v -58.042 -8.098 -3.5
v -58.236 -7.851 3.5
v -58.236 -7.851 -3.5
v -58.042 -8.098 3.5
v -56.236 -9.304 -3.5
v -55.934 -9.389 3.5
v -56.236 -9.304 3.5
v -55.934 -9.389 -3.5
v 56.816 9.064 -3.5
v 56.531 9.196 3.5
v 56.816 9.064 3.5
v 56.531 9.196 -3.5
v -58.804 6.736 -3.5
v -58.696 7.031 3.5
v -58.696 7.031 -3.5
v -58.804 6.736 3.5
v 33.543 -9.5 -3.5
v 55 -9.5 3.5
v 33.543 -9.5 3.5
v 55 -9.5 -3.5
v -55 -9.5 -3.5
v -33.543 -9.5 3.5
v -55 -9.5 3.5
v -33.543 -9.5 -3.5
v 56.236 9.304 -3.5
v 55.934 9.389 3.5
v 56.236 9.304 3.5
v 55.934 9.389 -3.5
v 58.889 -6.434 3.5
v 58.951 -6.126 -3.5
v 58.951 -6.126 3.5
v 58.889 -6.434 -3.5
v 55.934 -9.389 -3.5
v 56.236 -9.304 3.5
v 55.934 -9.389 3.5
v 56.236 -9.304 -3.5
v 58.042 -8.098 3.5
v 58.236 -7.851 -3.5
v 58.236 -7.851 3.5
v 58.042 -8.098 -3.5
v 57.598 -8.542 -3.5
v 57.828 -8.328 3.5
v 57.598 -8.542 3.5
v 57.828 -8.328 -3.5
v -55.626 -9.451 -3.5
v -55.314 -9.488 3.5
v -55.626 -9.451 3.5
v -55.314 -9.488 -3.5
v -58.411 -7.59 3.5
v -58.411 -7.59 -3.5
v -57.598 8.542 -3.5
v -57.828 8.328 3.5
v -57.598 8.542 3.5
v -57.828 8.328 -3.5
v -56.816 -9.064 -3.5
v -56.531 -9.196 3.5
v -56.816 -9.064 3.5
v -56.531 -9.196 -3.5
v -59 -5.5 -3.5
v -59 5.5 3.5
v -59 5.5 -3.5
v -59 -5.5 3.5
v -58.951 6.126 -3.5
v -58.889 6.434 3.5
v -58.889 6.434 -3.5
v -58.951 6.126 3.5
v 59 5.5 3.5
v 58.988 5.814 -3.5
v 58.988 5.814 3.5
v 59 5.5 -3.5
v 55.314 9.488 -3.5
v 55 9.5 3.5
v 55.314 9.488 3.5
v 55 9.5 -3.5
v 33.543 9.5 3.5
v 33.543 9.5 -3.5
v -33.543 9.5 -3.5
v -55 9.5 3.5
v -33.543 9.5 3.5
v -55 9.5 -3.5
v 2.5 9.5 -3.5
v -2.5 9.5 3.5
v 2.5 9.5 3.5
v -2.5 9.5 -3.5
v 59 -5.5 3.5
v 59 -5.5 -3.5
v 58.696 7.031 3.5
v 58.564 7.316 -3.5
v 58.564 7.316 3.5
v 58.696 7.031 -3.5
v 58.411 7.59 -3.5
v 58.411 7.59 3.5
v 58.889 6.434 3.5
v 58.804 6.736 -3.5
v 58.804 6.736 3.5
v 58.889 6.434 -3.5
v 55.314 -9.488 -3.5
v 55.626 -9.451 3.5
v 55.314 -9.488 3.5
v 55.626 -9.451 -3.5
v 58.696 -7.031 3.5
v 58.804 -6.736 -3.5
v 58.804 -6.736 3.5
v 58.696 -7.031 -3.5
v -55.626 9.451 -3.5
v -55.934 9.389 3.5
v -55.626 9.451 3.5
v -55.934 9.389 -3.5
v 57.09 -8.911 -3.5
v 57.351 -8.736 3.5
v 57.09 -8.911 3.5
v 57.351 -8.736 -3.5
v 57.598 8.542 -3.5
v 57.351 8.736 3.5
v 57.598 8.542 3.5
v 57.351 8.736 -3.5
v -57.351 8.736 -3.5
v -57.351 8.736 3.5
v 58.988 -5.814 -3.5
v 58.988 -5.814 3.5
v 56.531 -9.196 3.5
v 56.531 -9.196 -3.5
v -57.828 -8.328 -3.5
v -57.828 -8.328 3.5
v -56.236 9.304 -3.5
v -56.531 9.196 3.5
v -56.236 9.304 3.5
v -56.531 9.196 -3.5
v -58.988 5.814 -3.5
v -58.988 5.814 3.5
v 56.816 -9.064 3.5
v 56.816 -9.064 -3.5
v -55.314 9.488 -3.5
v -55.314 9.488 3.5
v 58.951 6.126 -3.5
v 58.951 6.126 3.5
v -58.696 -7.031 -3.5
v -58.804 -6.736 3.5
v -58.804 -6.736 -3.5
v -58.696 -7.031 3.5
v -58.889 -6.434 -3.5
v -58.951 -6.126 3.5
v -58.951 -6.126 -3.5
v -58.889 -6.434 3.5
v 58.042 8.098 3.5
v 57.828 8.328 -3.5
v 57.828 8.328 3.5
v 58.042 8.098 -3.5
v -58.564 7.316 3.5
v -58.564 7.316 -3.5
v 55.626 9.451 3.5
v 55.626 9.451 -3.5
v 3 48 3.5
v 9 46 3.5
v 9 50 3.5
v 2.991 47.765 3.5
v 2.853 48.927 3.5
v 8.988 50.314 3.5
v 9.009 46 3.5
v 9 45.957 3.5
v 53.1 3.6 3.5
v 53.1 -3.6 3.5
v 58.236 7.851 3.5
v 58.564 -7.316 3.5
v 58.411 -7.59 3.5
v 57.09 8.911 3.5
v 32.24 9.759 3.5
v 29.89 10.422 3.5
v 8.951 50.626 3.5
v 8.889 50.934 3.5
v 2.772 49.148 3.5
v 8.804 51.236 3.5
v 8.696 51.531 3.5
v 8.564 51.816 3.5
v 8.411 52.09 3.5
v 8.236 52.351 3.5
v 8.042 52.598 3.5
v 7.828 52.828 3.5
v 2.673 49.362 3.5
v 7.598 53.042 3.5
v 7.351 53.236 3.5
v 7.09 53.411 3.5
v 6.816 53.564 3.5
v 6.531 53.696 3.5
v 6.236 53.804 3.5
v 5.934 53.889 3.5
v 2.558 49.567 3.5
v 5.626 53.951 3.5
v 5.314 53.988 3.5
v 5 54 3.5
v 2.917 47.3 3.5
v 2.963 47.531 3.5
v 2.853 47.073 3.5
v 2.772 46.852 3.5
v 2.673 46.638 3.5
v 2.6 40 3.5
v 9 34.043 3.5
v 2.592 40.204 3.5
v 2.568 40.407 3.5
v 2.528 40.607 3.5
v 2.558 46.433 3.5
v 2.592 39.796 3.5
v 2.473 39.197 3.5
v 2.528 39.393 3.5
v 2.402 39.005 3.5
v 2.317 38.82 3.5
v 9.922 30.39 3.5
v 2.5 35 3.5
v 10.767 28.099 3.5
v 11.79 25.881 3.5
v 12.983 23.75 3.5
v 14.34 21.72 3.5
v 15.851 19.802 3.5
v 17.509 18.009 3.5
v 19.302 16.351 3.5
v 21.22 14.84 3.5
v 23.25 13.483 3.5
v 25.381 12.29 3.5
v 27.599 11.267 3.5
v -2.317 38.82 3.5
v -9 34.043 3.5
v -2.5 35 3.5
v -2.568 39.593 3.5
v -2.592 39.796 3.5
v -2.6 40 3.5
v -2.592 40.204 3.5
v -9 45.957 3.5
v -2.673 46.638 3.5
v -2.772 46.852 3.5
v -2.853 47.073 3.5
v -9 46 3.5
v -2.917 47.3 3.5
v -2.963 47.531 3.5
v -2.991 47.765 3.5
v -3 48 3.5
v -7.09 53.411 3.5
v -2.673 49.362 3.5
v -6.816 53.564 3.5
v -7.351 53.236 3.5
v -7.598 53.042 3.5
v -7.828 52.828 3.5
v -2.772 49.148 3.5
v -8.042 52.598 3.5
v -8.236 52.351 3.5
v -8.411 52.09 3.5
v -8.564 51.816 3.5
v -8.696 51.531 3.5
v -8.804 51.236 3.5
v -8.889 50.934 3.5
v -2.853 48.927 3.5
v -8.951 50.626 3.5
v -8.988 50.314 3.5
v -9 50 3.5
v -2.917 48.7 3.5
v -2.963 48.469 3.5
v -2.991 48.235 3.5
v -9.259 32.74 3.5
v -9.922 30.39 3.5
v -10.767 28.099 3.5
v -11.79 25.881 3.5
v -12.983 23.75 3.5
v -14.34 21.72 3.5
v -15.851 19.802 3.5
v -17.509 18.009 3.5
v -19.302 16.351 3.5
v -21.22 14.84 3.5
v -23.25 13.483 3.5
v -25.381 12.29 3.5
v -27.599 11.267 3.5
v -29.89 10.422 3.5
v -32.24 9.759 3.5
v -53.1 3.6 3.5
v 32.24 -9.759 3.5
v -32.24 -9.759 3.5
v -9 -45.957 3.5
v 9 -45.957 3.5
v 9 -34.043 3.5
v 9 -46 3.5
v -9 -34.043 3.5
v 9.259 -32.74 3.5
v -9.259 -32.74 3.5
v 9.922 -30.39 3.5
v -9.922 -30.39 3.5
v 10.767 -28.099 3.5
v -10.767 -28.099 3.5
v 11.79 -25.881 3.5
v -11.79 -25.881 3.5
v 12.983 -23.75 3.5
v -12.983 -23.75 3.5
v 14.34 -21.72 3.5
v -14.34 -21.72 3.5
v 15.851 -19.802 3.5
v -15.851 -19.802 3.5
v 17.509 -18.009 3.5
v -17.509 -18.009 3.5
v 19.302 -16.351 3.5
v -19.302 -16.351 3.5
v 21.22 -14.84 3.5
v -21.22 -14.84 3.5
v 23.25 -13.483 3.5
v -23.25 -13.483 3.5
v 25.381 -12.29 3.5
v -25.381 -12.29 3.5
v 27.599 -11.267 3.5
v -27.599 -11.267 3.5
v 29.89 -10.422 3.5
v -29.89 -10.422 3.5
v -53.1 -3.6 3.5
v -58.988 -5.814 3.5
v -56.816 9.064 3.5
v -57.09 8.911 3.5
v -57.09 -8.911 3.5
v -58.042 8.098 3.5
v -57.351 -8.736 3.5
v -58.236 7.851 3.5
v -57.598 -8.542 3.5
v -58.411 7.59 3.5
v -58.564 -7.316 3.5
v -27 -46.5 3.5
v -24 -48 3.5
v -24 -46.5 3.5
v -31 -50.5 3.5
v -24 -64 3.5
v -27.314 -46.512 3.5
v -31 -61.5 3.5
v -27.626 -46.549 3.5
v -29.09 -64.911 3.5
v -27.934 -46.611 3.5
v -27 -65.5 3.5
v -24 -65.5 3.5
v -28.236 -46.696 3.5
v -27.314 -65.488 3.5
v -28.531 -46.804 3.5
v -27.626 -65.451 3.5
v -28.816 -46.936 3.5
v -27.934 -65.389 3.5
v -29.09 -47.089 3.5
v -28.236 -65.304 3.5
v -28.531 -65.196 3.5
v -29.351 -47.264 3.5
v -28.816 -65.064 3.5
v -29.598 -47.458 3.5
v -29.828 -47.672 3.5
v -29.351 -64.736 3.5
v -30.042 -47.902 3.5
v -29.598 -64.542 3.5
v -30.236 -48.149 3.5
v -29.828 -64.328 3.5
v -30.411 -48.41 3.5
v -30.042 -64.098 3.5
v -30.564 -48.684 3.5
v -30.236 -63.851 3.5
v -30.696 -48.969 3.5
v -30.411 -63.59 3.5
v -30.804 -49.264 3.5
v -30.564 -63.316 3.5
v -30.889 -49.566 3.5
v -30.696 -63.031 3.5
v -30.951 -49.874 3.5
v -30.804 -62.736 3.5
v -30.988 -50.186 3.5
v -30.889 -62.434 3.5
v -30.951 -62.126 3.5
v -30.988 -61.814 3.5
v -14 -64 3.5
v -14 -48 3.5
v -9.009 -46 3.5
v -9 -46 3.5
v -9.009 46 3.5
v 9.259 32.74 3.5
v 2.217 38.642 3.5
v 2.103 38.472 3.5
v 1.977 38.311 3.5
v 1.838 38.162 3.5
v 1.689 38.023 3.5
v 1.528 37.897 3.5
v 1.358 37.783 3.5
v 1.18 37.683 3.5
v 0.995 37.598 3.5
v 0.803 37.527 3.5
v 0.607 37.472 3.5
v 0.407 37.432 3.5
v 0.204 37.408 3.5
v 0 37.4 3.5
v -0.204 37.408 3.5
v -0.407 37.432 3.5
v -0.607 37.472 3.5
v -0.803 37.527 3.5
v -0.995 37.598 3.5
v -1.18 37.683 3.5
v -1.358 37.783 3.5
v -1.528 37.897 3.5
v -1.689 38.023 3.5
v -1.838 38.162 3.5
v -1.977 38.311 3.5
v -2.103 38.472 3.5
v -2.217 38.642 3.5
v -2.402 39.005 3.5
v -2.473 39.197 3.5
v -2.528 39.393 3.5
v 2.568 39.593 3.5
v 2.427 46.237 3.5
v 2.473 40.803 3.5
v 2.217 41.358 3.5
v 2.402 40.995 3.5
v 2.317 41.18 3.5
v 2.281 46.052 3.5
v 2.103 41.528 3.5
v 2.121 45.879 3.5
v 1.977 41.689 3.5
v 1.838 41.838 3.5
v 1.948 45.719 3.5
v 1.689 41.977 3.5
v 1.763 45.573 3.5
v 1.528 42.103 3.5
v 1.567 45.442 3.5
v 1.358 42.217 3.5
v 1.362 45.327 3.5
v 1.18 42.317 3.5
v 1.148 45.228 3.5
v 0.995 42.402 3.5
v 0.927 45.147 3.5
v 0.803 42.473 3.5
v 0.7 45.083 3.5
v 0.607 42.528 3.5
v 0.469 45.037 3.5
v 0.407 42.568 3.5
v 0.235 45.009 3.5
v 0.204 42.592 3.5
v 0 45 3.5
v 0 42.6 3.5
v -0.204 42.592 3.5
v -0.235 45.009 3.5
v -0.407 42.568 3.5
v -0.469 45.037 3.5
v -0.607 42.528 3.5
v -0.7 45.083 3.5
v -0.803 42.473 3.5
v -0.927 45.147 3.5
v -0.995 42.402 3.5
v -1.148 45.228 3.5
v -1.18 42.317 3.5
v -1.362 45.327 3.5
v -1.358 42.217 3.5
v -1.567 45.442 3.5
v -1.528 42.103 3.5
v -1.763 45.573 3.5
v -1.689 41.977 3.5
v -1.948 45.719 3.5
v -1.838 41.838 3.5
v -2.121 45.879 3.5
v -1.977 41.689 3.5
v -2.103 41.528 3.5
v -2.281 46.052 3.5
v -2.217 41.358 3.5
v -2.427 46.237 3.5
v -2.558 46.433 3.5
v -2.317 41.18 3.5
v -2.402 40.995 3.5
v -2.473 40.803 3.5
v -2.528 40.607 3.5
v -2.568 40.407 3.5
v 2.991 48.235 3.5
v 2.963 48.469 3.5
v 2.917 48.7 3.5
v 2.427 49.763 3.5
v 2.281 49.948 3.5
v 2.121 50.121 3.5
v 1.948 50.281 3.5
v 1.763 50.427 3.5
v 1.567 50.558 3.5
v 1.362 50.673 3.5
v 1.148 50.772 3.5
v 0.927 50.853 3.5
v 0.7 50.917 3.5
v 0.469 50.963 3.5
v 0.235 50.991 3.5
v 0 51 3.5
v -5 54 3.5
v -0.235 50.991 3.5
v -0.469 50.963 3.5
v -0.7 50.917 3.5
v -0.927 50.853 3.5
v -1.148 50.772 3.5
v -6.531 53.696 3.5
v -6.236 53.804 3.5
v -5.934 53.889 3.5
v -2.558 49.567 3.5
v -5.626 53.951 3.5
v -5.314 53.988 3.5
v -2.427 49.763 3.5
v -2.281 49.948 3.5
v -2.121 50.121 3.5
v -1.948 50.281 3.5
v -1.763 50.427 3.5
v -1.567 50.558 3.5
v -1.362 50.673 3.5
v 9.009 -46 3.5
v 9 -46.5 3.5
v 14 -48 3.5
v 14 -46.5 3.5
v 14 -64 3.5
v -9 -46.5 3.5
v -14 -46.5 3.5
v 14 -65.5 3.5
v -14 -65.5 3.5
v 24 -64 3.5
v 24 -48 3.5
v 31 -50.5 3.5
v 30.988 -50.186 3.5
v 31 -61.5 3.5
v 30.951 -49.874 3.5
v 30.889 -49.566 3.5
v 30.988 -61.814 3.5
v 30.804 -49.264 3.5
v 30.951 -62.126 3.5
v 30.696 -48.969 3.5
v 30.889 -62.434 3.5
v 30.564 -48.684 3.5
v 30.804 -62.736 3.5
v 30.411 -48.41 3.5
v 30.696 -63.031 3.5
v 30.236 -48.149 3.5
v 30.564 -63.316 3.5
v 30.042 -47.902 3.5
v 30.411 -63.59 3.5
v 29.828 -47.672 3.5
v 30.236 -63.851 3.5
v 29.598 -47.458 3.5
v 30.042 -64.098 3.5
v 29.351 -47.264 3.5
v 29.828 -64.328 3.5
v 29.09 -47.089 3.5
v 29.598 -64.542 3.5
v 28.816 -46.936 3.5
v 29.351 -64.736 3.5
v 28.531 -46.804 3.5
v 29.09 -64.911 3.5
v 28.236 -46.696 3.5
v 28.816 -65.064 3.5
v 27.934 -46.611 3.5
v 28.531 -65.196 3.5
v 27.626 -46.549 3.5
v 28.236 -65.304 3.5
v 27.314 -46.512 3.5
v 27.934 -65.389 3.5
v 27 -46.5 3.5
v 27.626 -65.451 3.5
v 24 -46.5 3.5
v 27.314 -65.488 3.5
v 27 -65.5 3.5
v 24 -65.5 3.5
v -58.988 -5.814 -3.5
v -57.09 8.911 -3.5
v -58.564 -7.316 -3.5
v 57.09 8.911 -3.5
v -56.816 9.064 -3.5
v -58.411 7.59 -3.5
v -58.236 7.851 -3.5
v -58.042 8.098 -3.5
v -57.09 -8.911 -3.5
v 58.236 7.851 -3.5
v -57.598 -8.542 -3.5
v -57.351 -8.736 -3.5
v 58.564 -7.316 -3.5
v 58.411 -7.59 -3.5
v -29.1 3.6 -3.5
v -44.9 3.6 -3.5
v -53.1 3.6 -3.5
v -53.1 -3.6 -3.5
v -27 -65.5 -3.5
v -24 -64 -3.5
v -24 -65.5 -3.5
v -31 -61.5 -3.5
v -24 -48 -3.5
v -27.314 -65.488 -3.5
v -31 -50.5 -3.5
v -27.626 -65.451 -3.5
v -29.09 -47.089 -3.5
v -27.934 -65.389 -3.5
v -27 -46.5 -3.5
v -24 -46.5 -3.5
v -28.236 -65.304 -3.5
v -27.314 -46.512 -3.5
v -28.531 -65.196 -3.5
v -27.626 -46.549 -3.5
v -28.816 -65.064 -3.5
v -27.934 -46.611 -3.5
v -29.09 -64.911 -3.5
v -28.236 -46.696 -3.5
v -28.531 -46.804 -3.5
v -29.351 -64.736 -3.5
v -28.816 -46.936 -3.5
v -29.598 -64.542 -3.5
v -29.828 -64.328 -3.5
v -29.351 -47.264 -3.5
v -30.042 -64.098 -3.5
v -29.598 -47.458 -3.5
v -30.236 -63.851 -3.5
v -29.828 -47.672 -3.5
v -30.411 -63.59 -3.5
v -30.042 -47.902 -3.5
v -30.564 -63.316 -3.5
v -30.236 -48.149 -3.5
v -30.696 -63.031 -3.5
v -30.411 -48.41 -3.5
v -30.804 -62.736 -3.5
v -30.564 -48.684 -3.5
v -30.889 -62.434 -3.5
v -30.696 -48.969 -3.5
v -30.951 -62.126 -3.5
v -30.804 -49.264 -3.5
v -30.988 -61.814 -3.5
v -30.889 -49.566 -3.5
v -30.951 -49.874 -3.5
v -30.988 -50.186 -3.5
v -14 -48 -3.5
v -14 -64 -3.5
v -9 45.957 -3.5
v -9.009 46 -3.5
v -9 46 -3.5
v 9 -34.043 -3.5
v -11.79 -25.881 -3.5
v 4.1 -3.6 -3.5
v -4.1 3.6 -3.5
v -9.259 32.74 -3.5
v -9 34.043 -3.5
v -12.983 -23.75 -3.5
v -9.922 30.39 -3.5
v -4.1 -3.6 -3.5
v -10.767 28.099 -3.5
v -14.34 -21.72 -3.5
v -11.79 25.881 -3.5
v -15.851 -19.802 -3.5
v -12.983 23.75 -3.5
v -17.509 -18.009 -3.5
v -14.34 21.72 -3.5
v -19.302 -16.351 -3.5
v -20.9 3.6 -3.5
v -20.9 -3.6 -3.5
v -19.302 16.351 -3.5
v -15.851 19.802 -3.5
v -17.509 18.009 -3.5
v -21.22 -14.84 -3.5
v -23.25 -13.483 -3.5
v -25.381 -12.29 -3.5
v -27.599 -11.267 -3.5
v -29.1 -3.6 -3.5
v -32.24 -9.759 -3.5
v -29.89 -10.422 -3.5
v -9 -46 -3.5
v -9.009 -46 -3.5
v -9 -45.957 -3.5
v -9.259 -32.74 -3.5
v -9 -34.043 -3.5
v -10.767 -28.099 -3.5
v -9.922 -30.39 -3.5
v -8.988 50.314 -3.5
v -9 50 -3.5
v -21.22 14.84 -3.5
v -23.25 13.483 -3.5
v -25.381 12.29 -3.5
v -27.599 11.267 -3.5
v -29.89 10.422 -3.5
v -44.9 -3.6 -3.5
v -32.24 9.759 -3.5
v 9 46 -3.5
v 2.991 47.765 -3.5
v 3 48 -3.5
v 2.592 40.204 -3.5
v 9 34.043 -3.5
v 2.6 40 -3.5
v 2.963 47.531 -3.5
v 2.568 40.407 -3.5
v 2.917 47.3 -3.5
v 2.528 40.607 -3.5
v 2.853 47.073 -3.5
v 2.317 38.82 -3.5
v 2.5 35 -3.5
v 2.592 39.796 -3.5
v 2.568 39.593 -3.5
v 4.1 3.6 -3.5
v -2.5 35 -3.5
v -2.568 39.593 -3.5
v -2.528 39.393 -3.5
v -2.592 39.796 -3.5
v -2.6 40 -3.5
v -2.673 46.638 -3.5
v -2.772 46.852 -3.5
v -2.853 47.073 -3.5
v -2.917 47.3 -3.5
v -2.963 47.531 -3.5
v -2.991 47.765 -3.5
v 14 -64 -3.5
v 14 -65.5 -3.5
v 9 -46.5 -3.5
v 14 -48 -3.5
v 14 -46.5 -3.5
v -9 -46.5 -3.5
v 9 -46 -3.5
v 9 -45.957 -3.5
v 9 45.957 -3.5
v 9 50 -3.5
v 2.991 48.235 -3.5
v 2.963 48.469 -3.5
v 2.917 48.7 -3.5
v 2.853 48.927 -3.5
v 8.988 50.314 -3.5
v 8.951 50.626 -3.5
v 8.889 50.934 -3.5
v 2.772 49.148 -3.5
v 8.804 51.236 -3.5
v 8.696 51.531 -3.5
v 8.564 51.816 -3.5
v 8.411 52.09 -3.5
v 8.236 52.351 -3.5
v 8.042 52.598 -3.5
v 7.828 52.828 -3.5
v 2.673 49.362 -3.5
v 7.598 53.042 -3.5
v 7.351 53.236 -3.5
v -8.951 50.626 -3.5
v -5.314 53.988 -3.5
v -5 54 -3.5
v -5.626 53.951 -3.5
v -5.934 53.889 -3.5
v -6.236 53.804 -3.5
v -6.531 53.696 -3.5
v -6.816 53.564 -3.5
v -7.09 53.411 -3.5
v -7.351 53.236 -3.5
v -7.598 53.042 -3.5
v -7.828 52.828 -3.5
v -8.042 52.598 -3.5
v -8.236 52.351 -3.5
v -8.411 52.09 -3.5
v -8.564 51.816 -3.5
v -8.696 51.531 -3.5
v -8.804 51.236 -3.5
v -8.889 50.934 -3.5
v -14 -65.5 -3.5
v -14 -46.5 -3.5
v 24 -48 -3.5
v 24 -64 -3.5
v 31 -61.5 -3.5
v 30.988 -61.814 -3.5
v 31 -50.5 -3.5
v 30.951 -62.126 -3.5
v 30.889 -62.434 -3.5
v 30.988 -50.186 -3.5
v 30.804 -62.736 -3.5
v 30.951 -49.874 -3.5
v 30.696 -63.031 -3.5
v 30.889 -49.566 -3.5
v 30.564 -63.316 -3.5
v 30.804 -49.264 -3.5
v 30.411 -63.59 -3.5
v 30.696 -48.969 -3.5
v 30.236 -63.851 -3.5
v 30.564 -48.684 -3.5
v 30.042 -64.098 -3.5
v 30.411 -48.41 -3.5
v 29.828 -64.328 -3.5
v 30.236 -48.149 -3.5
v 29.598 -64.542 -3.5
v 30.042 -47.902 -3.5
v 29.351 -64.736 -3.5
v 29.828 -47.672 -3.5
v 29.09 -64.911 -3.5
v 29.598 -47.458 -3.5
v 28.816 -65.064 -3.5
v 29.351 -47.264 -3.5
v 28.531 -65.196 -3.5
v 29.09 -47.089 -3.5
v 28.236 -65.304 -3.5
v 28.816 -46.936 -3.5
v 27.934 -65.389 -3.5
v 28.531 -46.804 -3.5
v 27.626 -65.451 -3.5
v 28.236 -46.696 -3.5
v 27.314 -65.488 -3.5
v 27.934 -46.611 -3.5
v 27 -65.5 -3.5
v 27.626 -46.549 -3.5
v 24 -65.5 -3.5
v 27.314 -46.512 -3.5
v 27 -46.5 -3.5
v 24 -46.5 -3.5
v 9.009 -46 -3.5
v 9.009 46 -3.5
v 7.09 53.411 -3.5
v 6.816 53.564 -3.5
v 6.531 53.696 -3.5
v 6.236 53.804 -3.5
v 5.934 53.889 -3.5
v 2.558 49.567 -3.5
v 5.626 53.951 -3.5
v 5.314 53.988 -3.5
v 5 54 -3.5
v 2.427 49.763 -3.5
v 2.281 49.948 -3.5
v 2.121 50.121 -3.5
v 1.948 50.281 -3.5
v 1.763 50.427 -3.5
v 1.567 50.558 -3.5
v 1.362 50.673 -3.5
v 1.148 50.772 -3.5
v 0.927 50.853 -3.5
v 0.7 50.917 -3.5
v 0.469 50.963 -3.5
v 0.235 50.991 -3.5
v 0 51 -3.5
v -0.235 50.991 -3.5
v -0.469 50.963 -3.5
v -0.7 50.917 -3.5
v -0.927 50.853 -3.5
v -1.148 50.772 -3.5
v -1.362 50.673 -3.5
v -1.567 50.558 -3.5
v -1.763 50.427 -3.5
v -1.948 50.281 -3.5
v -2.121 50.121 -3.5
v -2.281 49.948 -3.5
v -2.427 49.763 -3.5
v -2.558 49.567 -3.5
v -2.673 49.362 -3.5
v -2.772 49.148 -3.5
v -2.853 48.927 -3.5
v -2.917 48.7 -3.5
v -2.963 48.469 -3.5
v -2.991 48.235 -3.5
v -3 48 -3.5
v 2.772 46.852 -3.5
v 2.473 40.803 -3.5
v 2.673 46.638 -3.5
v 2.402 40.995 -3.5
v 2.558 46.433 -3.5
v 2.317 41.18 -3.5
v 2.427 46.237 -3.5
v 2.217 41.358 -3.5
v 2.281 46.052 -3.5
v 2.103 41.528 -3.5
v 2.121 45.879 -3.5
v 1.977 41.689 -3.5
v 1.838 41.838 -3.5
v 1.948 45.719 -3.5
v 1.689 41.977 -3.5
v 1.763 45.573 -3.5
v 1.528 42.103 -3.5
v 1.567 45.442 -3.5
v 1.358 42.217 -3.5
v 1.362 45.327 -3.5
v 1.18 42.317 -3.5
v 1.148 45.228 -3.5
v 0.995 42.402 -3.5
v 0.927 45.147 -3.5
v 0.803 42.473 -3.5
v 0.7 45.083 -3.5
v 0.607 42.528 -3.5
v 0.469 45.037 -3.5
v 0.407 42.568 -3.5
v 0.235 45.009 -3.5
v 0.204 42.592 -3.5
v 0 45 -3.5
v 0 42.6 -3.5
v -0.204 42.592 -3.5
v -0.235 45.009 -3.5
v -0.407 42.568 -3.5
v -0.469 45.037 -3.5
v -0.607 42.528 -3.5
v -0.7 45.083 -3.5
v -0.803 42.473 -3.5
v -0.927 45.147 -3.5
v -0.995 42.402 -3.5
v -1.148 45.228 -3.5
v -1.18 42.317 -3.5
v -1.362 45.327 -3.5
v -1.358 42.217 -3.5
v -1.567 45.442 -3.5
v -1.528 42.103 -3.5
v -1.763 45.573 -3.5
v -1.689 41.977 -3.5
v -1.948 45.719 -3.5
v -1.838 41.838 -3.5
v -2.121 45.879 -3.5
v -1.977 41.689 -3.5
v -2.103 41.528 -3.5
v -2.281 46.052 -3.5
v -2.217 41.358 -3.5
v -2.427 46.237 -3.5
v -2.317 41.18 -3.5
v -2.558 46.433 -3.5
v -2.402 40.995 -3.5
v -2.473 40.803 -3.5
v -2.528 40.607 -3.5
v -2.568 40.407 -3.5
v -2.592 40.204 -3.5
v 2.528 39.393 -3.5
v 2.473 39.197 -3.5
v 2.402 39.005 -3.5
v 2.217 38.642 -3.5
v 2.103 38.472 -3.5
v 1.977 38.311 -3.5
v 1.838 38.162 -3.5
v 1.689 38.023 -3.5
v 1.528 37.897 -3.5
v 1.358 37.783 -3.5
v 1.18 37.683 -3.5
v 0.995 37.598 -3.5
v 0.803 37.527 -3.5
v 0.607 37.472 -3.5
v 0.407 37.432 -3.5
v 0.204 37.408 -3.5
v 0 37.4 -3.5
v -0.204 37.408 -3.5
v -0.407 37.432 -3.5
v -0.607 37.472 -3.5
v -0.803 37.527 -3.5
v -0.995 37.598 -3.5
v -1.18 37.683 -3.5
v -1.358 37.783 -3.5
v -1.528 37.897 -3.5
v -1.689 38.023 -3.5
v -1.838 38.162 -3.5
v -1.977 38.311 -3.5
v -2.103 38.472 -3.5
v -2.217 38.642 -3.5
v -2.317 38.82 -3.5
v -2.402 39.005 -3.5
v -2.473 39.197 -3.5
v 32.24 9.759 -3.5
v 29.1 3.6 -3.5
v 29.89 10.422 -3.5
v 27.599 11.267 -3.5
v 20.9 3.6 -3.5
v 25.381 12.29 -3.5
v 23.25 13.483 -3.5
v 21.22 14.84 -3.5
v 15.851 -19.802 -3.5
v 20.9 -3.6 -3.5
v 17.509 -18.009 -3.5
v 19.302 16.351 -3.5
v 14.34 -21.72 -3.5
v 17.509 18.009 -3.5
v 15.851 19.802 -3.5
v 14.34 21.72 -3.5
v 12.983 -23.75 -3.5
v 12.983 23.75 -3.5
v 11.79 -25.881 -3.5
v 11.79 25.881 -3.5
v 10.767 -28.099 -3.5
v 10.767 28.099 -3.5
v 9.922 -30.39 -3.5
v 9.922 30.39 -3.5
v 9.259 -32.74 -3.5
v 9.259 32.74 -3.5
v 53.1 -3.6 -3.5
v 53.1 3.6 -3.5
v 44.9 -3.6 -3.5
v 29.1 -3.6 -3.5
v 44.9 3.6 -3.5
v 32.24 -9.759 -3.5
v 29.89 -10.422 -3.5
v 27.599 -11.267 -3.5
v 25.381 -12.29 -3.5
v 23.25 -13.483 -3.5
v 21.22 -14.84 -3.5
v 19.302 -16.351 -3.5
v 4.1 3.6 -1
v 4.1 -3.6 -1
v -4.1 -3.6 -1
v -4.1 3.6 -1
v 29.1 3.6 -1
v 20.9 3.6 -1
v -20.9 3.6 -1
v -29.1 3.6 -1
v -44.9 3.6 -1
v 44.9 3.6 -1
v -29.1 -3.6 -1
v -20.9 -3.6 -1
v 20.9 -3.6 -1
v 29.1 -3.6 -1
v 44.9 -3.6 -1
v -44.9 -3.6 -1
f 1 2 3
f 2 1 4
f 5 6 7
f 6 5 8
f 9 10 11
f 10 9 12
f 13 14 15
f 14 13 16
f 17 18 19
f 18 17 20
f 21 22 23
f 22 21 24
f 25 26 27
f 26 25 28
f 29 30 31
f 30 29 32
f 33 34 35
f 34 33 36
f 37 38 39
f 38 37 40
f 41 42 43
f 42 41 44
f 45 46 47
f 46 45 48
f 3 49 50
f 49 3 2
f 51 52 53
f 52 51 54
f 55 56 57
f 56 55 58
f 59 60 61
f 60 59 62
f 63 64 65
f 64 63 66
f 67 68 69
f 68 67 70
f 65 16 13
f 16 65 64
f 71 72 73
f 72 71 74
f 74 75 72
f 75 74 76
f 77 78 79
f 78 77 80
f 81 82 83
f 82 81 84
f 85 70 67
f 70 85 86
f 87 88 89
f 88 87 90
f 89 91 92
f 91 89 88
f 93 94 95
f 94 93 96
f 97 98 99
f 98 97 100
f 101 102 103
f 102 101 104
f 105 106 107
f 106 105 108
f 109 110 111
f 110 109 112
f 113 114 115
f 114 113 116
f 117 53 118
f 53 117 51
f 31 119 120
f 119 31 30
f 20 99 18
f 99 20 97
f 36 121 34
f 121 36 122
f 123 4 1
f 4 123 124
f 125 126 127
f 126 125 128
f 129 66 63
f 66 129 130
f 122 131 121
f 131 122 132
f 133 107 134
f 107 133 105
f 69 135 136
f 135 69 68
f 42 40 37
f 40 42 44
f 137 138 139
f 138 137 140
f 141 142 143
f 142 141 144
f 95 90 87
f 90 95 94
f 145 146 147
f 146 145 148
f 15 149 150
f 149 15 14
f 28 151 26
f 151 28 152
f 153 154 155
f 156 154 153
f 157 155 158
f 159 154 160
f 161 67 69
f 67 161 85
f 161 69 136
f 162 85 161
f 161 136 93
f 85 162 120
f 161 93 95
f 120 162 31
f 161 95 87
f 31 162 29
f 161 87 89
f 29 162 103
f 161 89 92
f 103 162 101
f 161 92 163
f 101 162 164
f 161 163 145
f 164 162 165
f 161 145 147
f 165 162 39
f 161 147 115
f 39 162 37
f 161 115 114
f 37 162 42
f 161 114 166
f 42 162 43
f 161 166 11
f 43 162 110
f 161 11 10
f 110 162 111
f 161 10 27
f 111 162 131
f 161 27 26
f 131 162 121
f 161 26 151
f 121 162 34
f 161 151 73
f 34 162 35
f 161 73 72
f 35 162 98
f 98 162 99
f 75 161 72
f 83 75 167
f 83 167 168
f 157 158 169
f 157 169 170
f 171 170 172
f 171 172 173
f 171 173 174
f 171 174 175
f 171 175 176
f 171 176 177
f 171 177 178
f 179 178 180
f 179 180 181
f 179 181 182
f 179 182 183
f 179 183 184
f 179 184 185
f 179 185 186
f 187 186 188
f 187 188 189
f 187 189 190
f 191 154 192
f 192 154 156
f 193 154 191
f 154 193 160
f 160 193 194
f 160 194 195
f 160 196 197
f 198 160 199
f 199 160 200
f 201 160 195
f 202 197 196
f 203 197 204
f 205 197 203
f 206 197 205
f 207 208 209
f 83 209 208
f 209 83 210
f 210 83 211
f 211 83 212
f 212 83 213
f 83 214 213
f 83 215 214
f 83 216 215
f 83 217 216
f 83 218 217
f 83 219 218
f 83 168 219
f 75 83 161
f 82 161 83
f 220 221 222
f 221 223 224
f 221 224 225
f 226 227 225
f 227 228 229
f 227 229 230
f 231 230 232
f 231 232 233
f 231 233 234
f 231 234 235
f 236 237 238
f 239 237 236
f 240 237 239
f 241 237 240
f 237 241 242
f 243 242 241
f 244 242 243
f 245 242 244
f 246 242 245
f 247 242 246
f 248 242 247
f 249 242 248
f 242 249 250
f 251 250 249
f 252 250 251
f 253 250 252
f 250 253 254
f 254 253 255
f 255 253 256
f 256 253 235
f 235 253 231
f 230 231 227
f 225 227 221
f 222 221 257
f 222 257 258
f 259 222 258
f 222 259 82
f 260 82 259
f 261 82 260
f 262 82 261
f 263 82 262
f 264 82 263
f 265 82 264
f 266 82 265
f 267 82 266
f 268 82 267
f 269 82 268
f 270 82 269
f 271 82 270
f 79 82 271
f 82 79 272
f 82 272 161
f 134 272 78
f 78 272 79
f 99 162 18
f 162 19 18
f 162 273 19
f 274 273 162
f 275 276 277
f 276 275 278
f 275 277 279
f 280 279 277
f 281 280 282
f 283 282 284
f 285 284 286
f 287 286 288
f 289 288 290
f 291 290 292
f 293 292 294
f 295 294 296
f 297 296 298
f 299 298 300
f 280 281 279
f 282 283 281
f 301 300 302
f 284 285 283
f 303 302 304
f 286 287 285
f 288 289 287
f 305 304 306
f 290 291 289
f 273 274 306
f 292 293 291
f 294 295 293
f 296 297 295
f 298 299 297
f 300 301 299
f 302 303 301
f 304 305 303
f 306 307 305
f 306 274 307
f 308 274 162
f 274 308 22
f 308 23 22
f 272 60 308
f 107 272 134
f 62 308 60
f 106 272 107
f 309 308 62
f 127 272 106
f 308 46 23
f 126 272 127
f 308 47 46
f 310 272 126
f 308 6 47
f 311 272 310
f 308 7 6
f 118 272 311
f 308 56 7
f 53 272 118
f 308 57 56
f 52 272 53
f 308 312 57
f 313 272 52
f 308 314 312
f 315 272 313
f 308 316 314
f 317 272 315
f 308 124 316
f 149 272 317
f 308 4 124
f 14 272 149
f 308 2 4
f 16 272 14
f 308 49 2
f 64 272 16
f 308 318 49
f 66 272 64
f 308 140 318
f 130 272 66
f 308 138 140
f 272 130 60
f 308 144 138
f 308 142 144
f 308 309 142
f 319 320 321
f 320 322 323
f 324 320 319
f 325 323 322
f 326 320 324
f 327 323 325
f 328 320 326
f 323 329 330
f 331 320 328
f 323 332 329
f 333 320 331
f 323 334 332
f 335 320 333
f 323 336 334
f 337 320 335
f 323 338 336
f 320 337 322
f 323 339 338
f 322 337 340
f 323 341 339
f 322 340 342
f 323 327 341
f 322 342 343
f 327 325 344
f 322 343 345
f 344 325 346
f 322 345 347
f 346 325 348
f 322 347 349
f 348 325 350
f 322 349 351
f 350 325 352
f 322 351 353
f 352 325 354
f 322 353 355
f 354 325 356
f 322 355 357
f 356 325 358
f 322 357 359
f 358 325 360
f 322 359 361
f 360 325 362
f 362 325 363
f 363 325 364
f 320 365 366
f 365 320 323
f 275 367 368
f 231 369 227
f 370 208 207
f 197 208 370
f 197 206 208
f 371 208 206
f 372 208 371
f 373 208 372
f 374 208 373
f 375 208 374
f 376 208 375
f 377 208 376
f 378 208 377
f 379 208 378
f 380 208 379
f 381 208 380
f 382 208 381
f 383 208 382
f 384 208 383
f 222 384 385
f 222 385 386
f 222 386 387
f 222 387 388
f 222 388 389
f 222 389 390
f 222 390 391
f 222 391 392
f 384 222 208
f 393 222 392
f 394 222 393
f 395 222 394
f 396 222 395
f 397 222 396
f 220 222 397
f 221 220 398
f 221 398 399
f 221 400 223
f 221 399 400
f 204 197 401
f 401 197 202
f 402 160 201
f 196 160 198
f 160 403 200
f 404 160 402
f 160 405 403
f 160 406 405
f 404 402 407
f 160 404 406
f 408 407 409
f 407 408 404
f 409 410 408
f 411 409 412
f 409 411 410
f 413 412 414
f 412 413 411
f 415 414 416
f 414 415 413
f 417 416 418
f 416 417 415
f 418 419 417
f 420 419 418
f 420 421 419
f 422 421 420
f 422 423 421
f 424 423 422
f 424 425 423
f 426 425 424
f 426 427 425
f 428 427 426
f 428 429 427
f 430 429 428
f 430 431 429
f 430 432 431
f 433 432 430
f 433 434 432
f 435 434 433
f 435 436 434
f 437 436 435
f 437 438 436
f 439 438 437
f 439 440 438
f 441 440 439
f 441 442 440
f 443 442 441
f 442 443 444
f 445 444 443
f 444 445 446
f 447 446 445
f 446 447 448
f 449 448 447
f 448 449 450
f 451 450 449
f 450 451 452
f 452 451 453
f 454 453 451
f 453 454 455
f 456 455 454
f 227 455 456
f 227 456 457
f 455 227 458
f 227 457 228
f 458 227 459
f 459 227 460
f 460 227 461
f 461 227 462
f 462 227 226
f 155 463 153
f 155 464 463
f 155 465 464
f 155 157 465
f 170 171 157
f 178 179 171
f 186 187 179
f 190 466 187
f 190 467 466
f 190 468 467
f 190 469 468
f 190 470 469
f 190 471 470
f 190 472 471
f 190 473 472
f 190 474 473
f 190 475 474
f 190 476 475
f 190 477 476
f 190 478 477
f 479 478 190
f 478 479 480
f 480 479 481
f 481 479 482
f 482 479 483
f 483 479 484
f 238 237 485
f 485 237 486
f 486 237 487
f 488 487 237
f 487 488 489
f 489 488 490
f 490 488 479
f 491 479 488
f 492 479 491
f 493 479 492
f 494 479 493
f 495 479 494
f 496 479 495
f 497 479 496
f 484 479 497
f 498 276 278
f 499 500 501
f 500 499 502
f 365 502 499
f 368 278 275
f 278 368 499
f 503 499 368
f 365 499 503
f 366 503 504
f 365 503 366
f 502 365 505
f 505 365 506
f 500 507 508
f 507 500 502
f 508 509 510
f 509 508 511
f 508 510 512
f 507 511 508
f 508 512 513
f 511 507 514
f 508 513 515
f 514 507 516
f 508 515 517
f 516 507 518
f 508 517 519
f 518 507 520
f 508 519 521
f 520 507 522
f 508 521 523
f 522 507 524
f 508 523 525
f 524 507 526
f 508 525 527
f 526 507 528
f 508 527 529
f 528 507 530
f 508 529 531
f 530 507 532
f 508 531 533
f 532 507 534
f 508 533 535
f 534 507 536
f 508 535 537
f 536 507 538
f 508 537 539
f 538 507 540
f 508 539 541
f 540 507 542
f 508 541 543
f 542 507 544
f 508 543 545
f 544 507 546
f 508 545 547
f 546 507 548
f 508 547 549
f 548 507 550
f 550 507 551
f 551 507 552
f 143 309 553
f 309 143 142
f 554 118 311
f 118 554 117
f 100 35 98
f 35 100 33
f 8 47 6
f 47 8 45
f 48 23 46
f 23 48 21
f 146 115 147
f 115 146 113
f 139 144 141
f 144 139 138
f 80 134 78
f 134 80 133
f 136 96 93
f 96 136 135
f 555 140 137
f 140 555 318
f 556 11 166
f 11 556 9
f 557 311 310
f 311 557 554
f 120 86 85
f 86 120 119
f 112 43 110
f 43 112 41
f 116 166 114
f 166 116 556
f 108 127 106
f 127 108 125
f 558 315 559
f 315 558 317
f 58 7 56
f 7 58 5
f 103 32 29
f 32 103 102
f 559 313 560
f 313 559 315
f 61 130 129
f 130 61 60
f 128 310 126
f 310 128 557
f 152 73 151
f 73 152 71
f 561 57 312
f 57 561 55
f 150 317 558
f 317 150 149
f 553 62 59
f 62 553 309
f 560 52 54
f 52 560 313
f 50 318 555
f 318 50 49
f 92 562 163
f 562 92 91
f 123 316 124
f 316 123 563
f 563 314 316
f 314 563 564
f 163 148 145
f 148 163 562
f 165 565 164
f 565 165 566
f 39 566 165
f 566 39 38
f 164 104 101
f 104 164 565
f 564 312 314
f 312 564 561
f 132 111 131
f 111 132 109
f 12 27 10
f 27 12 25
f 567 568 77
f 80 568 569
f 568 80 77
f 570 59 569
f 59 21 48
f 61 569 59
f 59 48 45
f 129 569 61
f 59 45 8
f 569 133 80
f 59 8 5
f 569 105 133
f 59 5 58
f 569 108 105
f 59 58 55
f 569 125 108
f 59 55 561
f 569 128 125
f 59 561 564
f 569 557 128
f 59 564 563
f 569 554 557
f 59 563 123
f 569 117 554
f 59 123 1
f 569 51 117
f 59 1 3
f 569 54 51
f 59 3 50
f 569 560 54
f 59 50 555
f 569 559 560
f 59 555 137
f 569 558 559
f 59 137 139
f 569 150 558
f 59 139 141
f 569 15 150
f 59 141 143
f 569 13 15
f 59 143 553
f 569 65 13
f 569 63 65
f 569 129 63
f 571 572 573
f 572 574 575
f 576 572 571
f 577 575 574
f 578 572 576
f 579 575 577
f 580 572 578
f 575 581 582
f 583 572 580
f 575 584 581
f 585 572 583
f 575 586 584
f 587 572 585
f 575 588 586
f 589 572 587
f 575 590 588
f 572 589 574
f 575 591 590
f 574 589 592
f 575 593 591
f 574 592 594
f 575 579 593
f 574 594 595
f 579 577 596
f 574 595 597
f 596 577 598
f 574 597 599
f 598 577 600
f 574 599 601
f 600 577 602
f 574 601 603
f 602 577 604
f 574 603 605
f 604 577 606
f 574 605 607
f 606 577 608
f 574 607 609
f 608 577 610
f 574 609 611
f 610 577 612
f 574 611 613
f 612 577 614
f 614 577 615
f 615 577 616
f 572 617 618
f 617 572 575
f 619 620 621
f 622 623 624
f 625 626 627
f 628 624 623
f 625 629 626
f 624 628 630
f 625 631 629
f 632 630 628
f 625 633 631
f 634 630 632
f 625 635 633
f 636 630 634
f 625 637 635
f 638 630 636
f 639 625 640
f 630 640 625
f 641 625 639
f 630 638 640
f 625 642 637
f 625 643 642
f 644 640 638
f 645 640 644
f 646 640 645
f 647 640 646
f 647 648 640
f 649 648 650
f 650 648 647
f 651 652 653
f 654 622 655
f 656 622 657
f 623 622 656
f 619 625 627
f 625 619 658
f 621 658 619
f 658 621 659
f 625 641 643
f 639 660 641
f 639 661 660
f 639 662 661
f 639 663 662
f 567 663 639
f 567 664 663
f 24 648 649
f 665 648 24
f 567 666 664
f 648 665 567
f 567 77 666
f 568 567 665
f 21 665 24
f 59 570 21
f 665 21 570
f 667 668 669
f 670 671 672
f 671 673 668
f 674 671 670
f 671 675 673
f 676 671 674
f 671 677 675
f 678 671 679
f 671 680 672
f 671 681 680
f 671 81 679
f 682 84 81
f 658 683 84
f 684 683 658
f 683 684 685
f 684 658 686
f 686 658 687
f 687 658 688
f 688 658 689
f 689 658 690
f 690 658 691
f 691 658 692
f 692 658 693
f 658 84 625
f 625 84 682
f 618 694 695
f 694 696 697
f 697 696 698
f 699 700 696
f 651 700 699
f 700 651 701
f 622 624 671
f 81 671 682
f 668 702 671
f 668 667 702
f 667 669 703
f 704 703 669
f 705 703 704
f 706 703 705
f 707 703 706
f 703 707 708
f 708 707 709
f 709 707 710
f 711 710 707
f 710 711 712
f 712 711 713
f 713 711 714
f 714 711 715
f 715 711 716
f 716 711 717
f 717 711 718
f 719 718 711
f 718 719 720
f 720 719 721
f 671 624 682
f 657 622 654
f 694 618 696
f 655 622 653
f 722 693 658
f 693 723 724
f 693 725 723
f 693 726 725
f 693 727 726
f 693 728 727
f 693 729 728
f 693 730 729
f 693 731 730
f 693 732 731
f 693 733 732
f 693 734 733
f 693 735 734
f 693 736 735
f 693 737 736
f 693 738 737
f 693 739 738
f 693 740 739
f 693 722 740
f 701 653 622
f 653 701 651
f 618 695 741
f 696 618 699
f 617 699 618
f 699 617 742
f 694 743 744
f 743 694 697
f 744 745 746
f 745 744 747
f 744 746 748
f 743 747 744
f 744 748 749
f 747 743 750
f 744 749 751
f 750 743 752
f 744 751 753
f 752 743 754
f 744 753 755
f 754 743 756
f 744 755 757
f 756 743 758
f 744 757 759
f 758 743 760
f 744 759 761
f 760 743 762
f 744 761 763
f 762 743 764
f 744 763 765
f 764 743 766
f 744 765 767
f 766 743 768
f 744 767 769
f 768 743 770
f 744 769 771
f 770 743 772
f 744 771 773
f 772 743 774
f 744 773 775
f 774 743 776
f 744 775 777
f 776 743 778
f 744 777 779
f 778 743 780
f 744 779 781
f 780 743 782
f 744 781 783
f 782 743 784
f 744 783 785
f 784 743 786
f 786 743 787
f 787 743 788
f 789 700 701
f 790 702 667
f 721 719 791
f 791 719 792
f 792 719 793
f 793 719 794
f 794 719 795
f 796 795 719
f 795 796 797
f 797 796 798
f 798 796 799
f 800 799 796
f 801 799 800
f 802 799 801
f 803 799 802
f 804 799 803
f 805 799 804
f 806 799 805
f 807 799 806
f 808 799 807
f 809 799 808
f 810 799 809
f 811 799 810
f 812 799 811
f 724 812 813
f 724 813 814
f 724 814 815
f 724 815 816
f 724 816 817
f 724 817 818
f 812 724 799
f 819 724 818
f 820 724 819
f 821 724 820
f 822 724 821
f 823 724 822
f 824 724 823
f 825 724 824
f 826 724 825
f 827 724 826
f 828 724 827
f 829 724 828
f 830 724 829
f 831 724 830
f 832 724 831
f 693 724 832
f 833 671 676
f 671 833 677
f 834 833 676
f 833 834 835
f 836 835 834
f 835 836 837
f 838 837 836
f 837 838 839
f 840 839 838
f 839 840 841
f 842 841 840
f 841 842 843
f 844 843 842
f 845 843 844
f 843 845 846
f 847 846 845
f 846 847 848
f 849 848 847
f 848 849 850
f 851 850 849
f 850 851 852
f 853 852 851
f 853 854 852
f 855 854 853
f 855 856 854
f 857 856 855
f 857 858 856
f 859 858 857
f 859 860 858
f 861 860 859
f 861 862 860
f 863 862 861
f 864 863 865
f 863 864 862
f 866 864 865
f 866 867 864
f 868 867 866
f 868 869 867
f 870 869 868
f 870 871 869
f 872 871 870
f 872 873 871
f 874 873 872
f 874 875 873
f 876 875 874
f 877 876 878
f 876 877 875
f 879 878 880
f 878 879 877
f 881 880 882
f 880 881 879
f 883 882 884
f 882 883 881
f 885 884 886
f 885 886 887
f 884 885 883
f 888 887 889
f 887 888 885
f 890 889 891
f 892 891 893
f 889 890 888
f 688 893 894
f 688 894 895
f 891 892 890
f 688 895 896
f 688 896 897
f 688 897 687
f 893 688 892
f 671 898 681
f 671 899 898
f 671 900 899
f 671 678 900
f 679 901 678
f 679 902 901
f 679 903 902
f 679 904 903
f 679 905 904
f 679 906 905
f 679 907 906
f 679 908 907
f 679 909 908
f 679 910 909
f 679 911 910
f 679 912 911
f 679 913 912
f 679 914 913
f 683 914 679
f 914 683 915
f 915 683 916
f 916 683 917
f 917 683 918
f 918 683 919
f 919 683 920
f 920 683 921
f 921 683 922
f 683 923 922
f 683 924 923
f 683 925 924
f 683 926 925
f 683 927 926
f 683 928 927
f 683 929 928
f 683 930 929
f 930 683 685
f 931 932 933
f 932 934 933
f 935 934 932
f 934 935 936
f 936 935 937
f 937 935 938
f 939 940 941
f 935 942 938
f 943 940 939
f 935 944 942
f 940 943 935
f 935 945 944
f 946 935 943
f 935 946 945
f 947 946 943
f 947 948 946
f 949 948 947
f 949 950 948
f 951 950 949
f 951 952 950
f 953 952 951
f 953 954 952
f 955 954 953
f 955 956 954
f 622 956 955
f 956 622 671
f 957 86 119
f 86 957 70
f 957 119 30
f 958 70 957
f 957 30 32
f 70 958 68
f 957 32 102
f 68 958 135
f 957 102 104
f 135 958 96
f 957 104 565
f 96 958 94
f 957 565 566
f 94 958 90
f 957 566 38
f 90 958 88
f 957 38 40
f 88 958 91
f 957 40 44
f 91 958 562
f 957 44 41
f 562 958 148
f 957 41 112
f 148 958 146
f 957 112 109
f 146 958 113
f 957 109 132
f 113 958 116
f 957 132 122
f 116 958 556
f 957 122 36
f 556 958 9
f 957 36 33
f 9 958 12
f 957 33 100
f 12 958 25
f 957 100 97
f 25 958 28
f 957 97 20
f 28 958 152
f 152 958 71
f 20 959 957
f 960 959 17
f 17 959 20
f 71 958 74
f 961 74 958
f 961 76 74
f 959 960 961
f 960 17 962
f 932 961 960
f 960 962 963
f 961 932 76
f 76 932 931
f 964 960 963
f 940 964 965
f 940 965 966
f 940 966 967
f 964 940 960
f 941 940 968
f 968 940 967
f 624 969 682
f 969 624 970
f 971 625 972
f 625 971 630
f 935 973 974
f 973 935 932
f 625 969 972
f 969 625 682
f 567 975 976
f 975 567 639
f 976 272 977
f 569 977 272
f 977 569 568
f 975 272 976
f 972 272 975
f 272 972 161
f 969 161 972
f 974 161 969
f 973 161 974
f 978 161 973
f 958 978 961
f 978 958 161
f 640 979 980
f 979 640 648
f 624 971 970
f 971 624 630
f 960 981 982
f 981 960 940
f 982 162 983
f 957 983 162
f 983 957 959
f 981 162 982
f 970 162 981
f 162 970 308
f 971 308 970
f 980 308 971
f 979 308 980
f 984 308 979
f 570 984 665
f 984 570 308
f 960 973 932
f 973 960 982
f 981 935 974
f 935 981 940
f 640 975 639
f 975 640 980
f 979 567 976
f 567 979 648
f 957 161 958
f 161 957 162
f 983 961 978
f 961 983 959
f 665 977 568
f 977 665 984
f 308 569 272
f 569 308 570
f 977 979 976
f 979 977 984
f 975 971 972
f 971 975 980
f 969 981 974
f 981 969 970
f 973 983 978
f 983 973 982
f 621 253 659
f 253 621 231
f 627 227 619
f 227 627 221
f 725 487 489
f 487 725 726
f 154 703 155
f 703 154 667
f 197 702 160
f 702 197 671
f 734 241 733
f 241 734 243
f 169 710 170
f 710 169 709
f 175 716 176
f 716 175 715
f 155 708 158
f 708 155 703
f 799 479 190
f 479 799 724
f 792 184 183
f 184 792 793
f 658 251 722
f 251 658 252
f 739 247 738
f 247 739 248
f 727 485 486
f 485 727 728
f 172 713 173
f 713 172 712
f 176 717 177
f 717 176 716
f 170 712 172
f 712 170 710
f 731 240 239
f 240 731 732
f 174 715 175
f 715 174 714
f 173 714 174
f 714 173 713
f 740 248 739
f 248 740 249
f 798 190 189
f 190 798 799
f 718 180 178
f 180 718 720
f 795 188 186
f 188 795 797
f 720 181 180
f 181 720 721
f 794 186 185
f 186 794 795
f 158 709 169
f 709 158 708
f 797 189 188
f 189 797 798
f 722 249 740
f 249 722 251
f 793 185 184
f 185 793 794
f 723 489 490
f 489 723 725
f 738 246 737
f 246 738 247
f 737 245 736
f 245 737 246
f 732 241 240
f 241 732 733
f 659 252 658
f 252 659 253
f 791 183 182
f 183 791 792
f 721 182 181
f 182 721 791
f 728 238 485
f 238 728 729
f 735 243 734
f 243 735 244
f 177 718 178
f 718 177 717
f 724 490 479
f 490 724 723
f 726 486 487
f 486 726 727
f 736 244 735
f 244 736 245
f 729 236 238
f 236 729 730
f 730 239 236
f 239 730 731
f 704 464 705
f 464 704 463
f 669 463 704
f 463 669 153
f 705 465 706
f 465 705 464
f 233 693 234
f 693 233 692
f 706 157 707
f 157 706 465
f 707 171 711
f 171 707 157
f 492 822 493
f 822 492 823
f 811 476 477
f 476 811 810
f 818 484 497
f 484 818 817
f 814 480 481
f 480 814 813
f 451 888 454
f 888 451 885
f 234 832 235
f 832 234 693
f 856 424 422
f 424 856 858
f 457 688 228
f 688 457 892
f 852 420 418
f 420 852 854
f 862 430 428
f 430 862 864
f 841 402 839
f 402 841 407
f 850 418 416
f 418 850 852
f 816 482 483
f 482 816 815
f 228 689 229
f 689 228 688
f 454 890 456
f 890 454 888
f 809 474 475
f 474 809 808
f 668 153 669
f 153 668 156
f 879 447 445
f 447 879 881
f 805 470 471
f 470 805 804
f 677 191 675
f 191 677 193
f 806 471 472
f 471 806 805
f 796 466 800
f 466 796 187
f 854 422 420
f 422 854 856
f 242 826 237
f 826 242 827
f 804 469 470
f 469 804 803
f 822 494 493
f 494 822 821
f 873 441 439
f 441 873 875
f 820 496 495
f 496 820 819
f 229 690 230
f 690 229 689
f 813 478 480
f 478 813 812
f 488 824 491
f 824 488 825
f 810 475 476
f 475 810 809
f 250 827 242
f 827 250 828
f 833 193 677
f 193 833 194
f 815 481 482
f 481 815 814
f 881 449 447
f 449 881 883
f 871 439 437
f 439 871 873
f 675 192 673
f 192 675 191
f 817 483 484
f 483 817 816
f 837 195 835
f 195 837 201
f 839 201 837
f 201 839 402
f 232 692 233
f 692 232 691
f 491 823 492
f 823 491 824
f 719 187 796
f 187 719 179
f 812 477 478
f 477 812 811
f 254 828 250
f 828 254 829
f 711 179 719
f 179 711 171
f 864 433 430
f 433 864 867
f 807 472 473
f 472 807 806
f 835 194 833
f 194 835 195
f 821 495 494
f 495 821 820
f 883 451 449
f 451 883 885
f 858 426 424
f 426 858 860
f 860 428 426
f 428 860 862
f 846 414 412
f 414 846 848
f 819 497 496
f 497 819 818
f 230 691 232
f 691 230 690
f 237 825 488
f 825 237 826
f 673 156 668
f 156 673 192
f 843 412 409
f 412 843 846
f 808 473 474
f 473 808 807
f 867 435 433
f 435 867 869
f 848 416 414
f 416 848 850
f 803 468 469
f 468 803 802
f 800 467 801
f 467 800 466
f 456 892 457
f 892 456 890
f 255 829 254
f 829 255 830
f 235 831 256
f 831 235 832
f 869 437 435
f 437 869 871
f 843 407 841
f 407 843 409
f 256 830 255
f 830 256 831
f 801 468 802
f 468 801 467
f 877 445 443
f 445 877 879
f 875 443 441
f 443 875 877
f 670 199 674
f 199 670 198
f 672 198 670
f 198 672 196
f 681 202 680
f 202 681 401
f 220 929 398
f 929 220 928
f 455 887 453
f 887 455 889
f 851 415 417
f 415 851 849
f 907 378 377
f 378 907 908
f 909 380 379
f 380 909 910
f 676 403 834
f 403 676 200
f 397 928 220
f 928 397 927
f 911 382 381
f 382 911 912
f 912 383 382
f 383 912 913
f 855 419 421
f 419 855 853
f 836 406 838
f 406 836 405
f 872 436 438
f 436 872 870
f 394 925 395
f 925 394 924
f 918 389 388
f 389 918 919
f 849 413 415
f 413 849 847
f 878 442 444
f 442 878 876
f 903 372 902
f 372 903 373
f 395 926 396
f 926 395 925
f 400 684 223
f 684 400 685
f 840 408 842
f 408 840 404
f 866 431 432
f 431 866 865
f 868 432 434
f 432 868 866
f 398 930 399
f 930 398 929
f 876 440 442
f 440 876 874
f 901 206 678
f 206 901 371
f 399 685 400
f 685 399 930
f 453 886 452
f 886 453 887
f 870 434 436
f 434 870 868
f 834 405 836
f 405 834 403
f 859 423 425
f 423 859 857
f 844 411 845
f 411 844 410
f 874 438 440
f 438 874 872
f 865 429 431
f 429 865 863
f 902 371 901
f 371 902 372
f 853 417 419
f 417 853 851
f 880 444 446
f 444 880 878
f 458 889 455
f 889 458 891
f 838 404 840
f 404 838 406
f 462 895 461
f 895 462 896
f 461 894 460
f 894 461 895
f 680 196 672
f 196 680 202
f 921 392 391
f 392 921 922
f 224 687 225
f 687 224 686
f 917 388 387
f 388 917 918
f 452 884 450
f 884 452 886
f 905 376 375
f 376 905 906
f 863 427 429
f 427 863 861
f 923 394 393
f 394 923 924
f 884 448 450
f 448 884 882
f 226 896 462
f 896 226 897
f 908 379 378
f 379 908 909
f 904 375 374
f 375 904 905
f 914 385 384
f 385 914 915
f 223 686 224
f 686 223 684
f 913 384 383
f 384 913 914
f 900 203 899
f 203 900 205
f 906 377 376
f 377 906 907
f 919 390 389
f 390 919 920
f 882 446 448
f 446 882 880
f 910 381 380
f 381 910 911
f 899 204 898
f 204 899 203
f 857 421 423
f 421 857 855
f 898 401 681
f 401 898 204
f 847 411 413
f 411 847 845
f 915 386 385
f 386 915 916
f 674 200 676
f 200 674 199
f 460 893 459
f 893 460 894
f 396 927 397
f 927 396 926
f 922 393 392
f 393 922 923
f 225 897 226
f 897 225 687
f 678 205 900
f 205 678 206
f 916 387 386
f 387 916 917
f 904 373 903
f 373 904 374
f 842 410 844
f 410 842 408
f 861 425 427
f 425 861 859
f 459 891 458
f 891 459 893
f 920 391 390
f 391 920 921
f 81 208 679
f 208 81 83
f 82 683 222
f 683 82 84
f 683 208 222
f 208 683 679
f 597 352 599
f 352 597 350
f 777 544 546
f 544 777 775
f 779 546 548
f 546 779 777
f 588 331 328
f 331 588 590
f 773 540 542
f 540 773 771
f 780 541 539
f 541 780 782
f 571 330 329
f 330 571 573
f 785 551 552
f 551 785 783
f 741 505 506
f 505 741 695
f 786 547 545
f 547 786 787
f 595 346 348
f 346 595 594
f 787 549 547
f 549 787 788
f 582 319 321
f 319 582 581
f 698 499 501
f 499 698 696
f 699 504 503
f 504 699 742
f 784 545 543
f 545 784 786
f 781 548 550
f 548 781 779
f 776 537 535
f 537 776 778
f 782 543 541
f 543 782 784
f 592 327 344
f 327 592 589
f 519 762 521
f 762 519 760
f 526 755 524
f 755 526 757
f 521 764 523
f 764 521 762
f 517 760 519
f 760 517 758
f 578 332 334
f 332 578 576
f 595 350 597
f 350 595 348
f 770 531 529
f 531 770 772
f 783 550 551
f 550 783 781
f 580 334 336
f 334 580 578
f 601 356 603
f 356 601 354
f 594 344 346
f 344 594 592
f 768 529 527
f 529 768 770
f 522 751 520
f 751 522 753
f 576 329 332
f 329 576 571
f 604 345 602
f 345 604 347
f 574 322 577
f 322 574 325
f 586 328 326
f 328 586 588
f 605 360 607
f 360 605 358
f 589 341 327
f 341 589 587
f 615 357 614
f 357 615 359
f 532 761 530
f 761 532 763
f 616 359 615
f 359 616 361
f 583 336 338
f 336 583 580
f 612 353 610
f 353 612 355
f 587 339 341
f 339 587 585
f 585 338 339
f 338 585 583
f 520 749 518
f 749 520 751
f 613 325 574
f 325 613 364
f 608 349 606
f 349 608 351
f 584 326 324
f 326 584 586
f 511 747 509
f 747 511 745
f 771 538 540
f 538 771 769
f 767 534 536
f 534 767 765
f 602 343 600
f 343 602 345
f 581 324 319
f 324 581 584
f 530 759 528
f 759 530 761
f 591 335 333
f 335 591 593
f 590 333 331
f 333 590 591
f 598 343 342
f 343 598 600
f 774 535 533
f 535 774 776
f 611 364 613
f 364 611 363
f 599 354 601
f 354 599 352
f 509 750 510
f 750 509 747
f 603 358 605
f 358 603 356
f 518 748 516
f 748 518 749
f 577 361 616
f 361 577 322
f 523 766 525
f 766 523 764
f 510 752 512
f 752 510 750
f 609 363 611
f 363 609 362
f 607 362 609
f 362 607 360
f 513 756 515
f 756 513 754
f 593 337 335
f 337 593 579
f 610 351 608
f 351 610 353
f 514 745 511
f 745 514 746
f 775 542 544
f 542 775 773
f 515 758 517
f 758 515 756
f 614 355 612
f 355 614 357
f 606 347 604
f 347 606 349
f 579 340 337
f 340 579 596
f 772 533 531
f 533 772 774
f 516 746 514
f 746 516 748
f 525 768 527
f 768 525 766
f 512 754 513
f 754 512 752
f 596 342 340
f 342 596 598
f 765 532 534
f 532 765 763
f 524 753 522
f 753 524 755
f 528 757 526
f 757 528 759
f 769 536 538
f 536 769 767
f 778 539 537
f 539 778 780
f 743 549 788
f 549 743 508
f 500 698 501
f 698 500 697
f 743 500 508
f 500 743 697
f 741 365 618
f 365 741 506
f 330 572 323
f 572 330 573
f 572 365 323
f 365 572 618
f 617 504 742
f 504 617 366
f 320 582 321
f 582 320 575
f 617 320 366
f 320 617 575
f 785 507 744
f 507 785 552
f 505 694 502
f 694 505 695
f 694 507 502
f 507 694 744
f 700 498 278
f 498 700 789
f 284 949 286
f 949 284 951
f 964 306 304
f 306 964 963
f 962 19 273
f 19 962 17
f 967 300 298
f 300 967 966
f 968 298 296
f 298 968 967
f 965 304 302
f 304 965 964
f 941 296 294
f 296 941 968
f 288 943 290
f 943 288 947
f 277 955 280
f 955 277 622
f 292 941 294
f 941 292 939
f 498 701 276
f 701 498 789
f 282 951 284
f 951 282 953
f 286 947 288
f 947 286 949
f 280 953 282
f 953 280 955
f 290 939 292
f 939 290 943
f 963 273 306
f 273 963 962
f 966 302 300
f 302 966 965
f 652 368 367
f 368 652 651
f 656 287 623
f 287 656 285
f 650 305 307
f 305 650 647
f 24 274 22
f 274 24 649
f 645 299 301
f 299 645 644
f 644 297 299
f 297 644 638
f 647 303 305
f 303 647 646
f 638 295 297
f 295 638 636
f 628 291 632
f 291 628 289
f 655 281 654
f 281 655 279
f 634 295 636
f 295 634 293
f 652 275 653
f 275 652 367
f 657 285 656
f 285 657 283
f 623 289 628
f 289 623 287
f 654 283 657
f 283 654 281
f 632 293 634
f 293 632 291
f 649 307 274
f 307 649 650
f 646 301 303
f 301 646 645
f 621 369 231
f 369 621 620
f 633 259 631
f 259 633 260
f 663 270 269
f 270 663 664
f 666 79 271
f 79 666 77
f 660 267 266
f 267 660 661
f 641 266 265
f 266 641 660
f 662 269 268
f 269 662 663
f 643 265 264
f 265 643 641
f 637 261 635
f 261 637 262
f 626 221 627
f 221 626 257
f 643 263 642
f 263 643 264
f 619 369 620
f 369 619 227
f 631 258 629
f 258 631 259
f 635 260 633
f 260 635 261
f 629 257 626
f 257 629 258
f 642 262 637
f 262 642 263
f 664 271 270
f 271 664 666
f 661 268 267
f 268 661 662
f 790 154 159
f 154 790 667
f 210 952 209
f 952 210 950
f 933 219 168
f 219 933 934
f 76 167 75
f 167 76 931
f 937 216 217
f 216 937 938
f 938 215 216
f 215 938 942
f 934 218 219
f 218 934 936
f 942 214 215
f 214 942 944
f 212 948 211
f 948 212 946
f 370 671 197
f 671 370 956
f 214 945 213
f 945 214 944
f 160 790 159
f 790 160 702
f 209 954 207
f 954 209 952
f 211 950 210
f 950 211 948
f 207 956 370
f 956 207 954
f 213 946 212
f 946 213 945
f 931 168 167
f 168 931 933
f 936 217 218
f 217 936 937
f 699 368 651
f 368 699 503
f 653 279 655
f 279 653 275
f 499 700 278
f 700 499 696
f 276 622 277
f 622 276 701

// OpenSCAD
$fn = 80;
difference(){
	minkowski(){
	cube([110,11,5], center = true);
	cylinder(r=4, h=2, center=true);
	}
	translate([0,0,-4]){
		cube([8.2,7.2,16], center = true);
	}
	translate([25,0,-4]){
		cube([8.2,7.2,16], center = true);
	}
	translate([-25,0,-4]){
		cube([8.2,7.2,16], center = true);
	}
	translate([49,0,-4]){
		cube([8.2,7.2,16], center = true);
	}
	translate([-49,0,-4]){
		cube([8.2,7.2,16], center = true);
	}
	translate([0,0,2]){
		cube([100,7.2,6], center = true);
	}
}
translate([0,30,0]){
	difference(){
		minkowski(){
		cube([10,40,3], center = true);
		cylinder(r=4, h=4, center=true);		
		}
		translate([0,18,0]){
			cylinder(r=3, h=10, center = true);
		}
		translate([0,10,0]){
			cylinder(r=2.6, h=10, center = true);
		}
		translate([0,-20,0]){
			cube([5,50,10], center=true);
		}
	}
}
translate([0,-34,0]){
	difference(){
		minkowski(){
		cube([10,49,3], center = true);
		cylinder(r=4, h=4, center=true);		
		}
	}
}
difference(){
	translate([0,-56,0]){
		minkowski(){
			cube([54,11,5], center = true);
			cylinder(r=4, h=2, center=true);
		}
	}
	translate([19,-43,0]){
		cube([10,10,10], center=true);
	}
	translate([-19,-69,0]){
		cube([10,10,10], center=true);
	}
	translate([-19,-43,0]){
		cube([10,10,10], center=true);
	}
	translate([19,-69,0]){
		cube([10,10,10], center=true);
	}
}

rotate([180,0,0]){
difference(){
	translate([24,26,0]){
		cube([40,40,7], center=true);
	}
	translate([39.5,40,0]){
		cylinder(r=31.1,h=10,center=true);
	}
}
}
rotate([180,180,0]){
difference(){
	translate([24,26,0]){
		cube([40,40,7], center=true);
	}
	translate([39.5,40,0]){
		cylinder(r=31.1,h=10,center=true);
	}
}
}
rotate([0,180,0]){
difference(){
	translate([24,26,0]){
		cube([40,40,7], center=true);
	}
	translate([39.5,40,0]){
		cylinder(r=31.1,h=10,center=true);
	}
}
}
rotate([0,0,0]){
difference(){
	translate([24,26,0]){
		cube([40,40,7], center=true);
	}
	translate([39.5,40,0]){
		cylinder(r=31.1,h=10,center=true);
	}
}
}
